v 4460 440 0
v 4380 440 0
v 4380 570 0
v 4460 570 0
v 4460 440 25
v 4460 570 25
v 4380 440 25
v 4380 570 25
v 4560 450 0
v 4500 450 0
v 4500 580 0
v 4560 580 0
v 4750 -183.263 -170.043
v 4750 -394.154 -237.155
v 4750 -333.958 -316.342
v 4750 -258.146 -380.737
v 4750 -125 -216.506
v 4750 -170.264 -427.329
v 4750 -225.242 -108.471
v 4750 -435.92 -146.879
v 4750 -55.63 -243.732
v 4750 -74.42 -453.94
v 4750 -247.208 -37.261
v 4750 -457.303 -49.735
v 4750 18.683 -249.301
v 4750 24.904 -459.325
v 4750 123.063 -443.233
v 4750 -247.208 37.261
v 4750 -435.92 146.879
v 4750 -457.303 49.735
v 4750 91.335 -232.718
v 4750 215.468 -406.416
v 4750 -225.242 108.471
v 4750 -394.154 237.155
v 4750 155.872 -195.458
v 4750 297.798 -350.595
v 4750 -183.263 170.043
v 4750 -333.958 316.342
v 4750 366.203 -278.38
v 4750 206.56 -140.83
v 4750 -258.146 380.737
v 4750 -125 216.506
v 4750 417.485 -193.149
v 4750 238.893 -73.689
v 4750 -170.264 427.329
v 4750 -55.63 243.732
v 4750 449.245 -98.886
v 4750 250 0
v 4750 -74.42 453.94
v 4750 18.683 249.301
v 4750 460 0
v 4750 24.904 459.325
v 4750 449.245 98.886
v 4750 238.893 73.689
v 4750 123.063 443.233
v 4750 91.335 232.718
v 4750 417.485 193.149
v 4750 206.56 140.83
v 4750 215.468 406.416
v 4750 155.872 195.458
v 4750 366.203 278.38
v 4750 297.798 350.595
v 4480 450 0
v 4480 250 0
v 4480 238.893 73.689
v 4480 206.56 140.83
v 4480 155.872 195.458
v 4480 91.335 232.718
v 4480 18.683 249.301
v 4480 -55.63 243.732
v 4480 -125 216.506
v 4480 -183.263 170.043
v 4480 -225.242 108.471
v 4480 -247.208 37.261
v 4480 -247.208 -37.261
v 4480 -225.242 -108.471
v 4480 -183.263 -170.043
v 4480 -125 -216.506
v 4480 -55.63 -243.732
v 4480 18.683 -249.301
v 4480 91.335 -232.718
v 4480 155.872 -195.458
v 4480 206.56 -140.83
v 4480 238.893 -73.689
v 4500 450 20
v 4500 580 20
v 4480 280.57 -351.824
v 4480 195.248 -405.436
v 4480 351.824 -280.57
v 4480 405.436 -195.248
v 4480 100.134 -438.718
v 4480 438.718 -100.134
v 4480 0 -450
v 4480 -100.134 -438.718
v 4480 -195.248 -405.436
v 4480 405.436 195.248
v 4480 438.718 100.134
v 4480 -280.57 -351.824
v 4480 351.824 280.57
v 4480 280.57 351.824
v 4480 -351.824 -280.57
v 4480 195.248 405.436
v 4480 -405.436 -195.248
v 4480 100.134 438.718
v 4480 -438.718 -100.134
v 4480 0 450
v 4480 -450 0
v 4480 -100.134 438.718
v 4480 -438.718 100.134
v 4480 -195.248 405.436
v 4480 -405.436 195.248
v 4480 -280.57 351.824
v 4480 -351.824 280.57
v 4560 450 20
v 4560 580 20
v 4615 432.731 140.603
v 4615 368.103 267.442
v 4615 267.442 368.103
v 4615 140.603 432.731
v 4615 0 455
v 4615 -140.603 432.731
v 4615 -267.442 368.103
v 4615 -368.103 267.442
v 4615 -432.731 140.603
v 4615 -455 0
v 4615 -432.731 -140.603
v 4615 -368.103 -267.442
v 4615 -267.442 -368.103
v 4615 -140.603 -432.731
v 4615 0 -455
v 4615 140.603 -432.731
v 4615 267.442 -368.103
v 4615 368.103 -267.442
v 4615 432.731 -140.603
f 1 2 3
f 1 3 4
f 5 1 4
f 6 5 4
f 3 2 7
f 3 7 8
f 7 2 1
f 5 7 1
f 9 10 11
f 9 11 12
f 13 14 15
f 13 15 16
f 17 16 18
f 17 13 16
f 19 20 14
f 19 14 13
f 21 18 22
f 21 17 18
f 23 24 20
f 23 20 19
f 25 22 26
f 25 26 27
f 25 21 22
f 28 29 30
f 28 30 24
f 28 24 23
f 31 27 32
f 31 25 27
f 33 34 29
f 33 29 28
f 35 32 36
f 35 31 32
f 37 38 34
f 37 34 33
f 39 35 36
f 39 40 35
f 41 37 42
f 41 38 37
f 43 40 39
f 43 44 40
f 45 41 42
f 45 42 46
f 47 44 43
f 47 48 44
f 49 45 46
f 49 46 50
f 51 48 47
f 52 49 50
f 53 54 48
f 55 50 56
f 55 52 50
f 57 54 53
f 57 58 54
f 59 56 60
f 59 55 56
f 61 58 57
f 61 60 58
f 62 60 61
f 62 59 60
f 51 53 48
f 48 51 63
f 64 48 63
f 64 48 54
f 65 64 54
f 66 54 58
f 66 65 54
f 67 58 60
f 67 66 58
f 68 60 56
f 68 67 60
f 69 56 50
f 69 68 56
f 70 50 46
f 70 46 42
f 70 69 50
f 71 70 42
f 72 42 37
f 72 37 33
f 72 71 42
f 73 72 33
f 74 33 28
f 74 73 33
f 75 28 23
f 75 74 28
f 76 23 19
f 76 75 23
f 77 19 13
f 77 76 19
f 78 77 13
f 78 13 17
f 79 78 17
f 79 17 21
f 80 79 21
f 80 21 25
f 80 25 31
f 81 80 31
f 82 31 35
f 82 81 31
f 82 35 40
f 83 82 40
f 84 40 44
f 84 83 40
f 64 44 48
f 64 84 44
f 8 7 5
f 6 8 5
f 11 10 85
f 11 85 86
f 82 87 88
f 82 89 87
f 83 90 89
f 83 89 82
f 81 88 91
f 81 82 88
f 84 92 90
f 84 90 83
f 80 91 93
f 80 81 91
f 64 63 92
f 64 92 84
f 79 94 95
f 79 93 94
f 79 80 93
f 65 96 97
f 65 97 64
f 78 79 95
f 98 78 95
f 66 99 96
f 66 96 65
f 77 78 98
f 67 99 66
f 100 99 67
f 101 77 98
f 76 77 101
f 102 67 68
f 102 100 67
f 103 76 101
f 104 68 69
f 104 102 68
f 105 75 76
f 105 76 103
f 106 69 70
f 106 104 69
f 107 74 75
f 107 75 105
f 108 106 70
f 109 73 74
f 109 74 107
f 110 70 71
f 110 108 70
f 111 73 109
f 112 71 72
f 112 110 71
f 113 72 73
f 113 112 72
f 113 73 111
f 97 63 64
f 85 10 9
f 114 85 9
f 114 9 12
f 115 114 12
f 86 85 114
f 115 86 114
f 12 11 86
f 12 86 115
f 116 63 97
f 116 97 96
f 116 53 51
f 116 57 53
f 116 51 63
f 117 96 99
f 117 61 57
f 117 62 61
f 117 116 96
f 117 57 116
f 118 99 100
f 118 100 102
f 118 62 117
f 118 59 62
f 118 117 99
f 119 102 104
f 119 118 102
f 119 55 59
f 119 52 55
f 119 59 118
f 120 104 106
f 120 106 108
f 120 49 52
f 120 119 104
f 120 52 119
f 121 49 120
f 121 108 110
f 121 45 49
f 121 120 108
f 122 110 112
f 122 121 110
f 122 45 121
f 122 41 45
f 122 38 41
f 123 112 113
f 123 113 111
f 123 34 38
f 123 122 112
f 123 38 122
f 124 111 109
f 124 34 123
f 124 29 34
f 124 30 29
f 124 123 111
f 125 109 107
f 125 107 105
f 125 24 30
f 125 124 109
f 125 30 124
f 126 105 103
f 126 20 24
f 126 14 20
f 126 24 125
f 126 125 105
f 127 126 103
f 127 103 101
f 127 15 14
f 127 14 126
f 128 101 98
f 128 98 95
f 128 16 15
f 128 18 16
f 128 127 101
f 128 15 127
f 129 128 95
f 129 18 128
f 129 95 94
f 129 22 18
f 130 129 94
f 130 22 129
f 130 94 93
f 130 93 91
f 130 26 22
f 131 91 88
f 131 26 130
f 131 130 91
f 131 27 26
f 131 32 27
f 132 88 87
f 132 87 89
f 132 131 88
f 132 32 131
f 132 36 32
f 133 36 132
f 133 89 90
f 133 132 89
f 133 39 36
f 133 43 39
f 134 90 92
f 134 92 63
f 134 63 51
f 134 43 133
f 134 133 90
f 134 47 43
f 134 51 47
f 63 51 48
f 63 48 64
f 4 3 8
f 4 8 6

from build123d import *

# Parameters (mm, degrees)
SKETCH1_W           = 80
SKETCH1_H           = 130
BOSS_EXTRUDE1_DEPTH = 25
REVOLVE1_ANGLE      = 359.999999589
SKETCH3_W           = 60
SKETCH3_H           = 130
BOSS_EXTRUDE2_DEPTH = 20


with BuildPart() as part:
    # Sketch1 → Boss-Extrude1 (new body)
    with BuildSketch(Plane.XY):
        with Locations((4420, 505)):
            Rectangle(SKETCH1_W, SKETCH1_H)
    extrude(amount=BOSS_EXTRUDE1_DEPTH)


with BuildPart() as body_2:
    # Sketch2 → Revolve1 (revolve)
    with BuildSketch(Plane.XY):
        Polygon((4480, 250), (4480, 450), (4750, 460), (4750, 250), align=None)
    revolve(axis=Axis((0, 0, 0), (1, 0, 0)), revolution_arc=REVOLVE1_ANGLE)


with BuildPart() as body_3:
    # Sketch3 → Boss-Extrude2 (new body)
    with BuildSketch(Plane.XY):
        with Locations((4530, 515)):
            Rectangle(SKETCH3_W, SKETCH3_H)
    extrude(amount=BOSS_EXTRUDE2_DEPTH)


solid = Compound([part.part, body_2.part, body_3.part])
